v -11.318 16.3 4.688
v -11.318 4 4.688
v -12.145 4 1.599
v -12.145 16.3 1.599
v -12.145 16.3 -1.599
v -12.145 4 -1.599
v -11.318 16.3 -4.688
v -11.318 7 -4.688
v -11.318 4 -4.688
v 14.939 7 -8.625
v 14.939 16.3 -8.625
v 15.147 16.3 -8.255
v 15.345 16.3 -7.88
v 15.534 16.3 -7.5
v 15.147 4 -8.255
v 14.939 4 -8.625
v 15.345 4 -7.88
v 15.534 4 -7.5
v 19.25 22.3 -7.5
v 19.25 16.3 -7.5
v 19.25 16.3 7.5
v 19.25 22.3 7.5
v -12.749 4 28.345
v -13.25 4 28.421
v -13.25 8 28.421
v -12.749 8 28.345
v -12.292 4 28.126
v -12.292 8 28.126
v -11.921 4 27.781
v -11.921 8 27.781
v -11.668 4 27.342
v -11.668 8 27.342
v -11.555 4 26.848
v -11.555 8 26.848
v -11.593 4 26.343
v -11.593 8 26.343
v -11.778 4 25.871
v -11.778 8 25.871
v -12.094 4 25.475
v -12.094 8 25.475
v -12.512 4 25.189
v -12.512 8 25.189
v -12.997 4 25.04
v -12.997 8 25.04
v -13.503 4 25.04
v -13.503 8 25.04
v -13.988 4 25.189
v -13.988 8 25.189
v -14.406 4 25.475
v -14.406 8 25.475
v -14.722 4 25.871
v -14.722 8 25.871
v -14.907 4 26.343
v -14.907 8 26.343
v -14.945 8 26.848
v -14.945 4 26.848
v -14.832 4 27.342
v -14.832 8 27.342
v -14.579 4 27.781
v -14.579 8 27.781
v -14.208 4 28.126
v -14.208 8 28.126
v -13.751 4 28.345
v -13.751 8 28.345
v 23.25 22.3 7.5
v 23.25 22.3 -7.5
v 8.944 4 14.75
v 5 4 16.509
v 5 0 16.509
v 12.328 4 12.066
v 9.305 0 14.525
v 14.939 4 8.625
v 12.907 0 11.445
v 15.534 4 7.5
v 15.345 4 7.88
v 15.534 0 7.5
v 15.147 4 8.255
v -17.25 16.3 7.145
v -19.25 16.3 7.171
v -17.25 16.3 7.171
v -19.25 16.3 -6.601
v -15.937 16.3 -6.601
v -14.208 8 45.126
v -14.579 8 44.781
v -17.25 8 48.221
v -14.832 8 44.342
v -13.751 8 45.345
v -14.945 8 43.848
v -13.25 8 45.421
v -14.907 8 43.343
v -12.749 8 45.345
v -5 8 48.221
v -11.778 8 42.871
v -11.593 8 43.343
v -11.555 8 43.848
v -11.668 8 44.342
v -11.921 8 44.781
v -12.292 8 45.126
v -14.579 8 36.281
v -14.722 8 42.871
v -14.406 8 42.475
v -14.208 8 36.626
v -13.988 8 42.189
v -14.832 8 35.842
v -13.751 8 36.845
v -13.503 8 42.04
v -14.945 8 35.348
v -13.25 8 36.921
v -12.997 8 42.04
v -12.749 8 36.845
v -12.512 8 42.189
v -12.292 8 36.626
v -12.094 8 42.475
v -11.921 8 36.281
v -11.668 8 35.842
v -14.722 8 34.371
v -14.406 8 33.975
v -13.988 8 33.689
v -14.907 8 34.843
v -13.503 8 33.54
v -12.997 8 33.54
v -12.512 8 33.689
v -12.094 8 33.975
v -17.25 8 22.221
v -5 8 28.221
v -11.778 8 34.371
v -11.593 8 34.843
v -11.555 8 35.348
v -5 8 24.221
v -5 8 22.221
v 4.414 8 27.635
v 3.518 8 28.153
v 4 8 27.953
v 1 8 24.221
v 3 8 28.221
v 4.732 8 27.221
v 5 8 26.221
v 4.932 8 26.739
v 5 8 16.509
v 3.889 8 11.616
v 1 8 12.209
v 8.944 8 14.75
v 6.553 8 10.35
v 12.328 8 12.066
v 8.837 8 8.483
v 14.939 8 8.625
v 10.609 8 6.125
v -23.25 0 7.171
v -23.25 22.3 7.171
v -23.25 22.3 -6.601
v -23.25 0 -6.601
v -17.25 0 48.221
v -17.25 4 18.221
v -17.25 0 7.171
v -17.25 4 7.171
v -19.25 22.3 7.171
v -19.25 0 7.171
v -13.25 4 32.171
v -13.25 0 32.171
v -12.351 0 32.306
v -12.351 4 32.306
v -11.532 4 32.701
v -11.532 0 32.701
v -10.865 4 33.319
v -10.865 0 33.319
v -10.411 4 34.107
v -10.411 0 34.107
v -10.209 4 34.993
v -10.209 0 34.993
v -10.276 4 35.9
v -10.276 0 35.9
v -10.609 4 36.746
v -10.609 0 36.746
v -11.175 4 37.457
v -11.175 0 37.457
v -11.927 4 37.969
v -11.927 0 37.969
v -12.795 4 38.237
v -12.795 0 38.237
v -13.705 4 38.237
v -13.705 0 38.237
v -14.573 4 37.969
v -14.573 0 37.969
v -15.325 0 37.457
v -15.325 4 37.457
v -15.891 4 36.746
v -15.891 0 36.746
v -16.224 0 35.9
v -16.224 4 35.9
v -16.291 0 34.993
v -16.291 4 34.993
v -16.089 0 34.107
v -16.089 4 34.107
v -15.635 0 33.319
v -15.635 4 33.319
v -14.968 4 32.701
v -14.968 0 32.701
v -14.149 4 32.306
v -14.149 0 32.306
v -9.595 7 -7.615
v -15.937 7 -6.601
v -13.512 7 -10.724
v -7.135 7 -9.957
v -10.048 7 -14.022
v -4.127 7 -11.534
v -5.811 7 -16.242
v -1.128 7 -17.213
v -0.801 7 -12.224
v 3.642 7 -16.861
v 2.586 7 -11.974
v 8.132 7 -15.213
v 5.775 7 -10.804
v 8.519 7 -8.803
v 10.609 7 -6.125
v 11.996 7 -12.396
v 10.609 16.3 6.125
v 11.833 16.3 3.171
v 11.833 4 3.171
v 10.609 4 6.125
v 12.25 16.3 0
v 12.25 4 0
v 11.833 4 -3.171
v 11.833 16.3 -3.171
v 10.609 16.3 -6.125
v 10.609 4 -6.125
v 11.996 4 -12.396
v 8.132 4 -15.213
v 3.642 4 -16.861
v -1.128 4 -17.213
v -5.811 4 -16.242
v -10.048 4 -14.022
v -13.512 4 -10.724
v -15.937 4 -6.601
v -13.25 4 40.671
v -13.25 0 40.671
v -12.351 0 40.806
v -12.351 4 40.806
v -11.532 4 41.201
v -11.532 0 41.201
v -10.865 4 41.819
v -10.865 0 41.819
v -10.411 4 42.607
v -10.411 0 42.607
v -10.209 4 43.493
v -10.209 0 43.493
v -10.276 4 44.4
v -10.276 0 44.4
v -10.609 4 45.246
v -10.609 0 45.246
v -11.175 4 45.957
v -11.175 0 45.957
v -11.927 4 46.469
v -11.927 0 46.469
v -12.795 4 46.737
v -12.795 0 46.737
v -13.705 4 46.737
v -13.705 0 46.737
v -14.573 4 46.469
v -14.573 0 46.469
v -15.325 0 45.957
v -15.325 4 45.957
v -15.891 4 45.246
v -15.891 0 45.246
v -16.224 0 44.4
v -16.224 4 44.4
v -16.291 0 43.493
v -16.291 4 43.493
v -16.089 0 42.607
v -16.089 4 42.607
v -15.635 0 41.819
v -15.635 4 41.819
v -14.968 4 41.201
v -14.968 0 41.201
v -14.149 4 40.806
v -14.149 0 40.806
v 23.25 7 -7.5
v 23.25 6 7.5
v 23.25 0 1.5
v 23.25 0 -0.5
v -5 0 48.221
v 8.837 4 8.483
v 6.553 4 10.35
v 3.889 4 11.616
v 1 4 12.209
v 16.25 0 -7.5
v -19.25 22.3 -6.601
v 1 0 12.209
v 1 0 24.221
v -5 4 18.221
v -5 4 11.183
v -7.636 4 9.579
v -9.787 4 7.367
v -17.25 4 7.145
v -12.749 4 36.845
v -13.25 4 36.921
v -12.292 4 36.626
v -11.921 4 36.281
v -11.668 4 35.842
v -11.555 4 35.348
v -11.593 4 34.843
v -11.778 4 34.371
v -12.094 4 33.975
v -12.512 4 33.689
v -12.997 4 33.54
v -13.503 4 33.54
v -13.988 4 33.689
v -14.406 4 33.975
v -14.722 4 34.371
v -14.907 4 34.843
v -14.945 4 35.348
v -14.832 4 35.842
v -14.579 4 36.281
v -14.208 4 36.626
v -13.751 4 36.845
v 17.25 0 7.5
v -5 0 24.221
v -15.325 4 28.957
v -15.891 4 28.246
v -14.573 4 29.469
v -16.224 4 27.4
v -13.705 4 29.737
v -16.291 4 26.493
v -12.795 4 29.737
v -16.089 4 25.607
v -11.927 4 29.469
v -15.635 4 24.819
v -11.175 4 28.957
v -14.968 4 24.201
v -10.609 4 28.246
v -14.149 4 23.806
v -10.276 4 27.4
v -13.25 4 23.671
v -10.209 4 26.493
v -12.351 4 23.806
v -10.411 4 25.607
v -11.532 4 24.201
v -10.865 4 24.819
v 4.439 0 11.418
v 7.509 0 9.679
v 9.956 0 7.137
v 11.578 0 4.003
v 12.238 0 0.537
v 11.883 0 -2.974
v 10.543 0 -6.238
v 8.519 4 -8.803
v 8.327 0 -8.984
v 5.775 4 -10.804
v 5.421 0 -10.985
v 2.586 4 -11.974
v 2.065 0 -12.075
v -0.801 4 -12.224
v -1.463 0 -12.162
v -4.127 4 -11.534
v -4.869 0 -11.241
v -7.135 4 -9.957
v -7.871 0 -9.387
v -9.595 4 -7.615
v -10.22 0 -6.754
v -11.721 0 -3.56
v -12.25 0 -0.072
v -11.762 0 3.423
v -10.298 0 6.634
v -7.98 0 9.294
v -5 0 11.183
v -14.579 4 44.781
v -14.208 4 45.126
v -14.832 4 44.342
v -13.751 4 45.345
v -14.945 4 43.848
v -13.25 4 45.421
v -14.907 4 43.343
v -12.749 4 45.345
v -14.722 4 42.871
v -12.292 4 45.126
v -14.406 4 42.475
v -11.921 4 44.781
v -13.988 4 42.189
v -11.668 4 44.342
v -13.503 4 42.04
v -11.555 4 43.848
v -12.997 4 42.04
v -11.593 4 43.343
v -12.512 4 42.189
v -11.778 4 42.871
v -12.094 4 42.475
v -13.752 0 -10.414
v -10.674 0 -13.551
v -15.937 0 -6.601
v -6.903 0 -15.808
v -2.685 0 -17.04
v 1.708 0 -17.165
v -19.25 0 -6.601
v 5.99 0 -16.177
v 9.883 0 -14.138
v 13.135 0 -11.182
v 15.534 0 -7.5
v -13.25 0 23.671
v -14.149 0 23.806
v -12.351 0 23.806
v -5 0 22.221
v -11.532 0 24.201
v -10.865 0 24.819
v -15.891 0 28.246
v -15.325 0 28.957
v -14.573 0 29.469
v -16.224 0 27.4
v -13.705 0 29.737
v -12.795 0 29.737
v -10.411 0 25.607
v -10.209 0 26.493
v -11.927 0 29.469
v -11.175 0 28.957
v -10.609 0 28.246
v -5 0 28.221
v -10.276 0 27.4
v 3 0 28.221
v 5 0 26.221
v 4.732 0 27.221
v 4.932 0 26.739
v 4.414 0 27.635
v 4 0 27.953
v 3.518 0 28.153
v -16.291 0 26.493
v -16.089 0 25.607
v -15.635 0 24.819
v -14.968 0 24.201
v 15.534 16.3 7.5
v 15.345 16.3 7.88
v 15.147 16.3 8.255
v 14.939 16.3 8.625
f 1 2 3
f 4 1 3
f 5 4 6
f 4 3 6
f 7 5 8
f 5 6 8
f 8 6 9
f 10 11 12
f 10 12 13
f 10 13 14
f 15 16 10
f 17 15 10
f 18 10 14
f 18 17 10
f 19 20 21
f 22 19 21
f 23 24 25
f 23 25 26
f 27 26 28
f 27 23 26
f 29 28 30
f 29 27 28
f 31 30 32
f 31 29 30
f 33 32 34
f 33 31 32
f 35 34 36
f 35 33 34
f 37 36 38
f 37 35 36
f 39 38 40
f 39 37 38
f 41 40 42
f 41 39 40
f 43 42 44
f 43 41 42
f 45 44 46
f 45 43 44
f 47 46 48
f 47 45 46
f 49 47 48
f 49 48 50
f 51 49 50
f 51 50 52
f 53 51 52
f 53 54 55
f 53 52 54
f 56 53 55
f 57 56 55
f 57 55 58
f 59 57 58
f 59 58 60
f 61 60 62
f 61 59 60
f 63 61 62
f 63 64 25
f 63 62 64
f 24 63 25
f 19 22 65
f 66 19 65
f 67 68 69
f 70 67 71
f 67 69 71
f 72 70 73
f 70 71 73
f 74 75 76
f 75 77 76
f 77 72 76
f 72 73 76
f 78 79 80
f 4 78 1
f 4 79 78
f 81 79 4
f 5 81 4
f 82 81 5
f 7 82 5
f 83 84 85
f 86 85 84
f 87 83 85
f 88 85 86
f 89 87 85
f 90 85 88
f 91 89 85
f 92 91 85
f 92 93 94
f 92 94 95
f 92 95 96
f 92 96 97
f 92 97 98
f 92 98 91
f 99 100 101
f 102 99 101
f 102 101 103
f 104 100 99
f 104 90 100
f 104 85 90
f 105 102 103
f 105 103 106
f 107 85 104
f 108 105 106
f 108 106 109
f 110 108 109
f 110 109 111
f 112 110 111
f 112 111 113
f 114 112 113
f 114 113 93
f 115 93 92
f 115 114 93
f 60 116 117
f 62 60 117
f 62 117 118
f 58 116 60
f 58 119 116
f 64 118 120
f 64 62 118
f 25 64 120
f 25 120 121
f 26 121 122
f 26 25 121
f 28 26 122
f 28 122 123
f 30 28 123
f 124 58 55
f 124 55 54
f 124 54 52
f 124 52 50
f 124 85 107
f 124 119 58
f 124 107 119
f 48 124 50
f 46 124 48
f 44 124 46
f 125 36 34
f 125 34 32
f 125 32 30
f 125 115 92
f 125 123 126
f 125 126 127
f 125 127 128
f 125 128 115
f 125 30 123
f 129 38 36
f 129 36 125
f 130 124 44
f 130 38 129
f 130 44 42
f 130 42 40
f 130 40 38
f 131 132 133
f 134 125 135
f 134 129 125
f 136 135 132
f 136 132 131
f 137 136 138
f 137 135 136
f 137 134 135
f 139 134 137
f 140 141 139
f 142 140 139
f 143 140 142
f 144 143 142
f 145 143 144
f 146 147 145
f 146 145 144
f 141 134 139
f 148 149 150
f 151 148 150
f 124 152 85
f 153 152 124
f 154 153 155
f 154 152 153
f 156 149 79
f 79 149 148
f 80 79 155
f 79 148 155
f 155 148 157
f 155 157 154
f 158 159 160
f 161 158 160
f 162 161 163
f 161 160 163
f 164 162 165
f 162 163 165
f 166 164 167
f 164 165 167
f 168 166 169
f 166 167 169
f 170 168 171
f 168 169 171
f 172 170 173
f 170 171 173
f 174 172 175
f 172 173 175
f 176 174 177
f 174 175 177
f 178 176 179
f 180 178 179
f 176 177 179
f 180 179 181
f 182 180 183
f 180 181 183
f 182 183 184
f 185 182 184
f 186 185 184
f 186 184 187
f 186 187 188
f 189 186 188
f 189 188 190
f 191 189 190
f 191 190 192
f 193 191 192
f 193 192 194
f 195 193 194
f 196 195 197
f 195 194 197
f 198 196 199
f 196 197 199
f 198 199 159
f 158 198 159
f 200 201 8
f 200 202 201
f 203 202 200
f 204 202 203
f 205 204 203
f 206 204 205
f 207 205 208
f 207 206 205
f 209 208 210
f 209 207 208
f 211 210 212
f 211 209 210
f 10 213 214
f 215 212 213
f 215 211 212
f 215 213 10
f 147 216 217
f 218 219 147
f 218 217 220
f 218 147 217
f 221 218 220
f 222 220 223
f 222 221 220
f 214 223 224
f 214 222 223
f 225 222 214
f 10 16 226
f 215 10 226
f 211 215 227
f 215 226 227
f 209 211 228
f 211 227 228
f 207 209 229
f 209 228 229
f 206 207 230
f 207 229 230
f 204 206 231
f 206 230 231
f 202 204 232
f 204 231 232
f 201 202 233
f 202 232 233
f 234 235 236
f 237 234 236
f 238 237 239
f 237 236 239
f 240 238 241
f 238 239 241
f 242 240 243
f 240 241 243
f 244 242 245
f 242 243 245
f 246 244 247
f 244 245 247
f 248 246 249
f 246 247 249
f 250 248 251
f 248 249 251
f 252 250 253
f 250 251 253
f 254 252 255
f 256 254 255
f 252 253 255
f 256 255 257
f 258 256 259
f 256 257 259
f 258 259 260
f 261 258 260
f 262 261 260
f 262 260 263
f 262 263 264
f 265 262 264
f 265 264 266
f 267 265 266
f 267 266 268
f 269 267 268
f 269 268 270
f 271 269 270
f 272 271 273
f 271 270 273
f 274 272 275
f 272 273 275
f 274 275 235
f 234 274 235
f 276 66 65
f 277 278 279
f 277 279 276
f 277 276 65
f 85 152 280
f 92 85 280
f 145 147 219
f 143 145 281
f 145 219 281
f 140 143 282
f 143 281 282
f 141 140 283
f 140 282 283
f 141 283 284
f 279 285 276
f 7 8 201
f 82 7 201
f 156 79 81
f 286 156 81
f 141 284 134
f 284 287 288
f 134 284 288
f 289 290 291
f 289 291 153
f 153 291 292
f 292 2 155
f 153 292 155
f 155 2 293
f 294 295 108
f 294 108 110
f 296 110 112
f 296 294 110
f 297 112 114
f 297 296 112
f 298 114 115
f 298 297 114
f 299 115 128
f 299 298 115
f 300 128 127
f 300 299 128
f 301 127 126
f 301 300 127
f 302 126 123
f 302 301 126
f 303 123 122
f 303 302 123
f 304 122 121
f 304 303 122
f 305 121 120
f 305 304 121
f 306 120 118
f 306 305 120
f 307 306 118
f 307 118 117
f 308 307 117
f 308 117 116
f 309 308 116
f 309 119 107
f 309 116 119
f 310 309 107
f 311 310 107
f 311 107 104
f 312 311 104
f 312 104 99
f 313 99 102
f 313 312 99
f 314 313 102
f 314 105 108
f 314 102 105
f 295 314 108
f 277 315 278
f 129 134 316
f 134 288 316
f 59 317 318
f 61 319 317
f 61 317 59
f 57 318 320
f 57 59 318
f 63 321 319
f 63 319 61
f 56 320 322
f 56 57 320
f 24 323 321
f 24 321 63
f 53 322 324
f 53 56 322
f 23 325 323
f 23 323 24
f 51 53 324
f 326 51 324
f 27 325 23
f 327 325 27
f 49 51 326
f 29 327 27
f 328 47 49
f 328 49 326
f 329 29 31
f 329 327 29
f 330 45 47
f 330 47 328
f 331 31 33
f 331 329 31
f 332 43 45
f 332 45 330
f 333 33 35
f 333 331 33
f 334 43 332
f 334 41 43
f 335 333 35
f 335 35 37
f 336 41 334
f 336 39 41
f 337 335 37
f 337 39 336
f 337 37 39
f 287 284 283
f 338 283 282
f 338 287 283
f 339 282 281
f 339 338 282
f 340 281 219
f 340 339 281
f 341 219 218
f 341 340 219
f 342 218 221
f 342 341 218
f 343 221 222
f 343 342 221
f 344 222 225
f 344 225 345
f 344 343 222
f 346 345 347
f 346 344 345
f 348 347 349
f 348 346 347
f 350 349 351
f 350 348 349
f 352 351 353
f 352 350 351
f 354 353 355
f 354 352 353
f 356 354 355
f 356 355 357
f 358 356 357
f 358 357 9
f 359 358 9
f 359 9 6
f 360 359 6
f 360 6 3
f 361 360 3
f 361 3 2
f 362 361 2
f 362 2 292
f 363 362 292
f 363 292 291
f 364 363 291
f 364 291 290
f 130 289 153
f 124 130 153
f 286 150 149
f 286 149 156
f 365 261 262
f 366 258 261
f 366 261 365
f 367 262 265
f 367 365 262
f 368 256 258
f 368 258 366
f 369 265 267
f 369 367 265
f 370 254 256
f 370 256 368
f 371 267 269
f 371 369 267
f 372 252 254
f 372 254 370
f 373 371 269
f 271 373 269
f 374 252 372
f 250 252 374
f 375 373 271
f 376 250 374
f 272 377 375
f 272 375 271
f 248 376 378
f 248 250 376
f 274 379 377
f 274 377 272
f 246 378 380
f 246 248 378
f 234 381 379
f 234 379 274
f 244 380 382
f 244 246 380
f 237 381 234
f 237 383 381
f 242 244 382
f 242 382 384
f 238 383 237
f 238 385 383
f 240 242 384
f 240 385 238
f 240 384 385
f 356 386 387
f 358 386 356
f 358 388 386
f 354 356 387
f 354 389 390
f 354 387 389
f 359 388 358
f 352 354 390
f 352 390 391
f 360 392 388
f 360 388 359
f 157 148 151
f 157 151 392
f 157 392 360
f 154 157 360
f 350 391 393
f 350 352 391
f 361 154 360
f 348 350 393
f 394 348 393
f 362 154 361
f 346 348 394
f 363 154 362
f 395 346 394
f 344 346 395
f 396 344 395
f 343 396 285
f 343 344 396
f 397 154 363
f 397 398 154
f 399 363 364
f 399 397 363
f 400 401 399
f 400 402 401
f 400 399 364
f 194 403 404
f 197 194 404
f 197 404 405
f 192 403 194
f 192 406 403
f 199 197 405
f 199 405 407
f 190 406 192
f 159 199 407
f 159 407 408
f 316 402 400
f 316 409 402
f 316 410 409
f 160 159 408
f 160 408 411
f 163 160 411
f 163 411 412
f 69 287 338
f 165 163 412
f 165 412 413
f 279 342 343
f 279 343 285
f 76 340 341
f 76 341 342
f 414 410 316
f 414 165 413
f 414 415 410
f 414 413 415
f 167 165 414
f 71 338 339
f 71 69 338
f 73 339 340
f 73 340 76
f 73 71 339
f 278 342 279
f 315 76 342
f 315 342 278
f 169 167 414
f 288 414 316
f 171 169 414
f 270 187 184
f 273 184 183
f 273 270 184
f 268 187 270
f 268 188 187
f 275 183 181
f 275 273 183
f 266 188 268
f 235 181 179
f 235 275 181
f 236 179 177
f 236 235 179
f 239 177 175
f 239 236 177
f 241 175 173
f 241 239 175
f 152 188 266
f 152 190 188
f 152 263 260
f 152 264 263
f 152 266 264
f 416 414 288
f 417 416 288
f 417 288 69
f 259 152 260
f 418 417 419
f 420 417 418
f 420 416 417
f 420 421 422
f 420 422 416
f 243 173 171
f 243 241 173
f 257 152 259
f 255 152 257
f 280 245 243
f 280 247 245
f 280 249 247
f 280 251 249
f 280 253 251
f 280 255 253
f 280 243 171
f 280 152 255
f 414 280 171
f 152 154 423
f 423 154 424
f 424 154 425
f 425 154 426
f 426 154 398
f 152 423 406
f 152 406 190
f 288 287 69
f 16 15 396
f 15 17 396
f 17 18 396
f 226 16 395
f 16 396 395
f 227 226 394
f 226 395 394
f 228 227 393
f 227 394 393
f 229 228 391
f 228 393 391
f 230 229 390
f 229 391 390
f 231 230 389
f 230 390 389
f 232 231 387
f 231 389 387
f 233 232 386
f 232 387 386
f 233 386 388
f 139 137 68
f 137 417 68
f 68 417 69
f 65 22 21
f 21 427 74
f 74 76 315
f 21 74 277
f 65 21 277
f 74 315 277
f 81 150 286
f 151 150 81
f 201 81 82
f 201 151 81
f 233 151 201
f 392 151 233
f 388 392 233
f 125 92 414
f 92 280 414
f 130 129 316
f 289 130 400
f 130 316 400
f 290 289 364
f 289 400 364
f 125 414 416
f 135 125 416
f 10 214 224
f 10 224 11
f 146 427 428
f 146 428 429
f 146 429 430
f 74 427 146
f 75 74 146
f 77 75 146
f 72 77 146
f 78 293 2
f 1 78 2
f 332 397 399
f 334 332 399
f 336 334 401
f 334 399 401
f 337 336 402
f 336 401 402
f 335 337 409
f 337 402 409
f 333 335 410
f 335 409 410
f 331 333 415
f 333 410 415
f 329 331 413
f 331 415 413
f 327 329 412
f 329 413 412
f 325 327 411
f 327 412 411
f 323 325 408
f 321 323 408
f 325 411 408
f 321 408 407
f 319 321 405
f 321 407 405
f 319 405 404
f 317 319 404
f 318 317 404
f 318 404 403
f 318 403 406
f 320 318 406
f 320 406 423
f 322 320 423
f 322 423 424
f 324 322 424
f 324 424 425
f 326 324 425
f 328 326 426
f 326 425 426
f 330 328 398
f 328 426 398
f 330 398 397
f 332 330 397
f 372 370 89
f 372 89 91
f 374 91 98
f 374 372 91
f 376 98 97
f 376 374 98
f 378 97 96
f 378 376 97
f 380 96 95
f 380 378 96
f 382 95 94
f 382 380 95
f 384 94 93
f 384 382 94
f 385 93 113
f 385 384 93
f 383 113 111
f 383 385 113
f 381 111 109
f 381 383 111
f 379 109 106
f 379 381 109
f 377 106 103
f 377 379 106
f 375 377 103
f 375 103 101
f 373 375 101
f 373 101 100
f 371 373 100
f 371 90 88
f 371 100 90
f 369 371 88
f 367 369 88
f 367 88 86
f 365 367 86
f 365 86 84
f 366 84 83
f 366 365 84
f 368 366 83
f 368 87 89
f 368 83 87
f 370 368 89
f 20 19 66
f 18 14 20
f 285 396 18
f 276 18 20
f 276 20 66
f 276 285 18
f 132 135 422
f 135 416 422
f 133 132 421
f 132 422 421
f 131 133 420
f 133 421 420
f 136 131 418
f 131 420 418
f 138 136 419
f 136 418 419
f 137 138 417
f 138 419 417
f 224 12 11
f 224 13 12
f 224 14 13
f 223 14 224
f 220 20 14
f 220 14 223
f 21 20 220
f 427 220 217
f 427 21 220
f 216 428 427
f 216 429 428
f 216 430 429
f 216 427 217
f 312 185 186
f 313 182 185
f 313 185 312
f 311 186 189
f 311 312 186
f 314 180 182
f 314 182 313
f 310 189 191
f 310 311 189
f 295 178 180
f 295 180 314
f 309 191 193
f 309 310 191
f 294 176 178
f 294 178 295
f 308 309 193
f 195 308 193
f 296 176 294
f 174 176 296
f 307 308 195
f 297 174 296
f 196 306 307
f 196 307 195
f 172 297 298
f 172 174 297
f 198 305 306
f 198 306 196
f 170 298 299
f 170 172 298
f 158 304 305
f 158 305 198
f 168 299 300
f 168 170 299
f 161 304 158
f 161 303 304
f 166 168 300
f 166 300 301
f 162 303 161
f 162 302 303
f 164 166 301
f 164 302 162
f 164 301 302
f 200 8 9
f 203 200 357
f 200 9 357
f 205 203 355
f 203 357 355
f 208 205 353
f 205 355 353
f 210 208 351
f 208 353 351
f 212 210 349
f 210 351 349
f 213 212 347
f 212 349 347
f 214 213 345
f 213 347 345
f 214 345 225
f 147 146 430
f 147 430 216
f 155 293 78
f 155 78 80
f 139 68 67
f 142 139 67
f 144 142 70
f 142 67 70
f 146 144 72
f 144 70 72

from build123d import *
from build123d.topology import SkipClean

# Parameters (mm, degrees)
SKETCH1_R                = 17.25
SKETCH1_R_2              = 12.25
BOSS_EXTRUDE1_DEPTH      = 4
SKETCH2_W                = 6
SKETCH2_H                = 6.066865377
CUT_EXTRUDE1_DEPTH       = 25.720942539
BOSS_EXTRUDE2_START      = -4
BOSS_EXTRUDE2_DEPTH      = 4
BOSS_EXTRUDE3_DEPTH      = 12.3
BOSS_EXTRUDE4_DEPTH      = 4
BOSS_EXTRUDE4_DEPTH_BACK = 4
SKETCH5_W                = 12.25
SKETCH5_H                = 26
CUT_EXTRUDE2_DEPTH       = 53.669881205
CUT_EXTRUDE2_DEPTH_BACK  = 53.669881205
SKETCH6_R                = 1.7
SKETCH7_R                = 3.05
CUT_EXTRUDE6_DEPTH       = 4
CHAMFER1_SIZE            = 4
BOSS_EXTRUDE5_REACH      = 55.745
BOSS_EXTRUDE6_DEPTH      = 6
BOSS_EXTRUDE6_DEPTH_BACK = 16.3
SKETCH9_W                = 4
SKETCH9_H                = 13.772279307
BOSS_EXTRUDE7_DEPTH      = 4
BOSS_EXTRUDE8_DEPTH      = 16.3
SKETCH12_W               = 4
SKETCH12_H               = 15
BOSS_EXTRUDE9_DEPTH      = 22.3
CHAMFER2_START           = 13.712068893
CHAMFER2_OUTLINE_W       = 11
CHAMFER2_OUTLINE_H       = 13
CHAMFER2_DEPTH           = 5.287931107
CHAMFER3_START           = 14.289419162
CHAMFER3_OUTLINE_W       = 10
CHAMFER3_OUTLINE_H       = 11
CHAMFER3_DEPTH           = 10.664231106
BOSS_EXTRUDE10_DEPTH     = 3
BOSS_EXTRUDE11_DEPTH     = 4


with BuildPart() as part:
    # Sketch1 → Boss-Extrude1 (new body)
    with BuildSketch(Plane(origin=(0, 0, 0), x_dir=(1, 0, 0), z_dir=(0, 1, 0))):
        with Locations(Location((0, 0, 0), (0, 0, 270))):
            Circle(SKETCH1_R)
        with Locations(Location((0, 0, 0), (0, 0, 270))):
            Circle(SKETCH1_R_2, mode=Mode.SUBTRACT)
    extrude(amount=BOSS_EXTRUDE1_DEPTH)

    # Sketch2 → Cut-Extrude1 (cut, through all)
    with BuildSketch(Plane(origin=(0, 4, 0), x_dir=(1, 0, 0), z_dir=(0, 1, 0))):
        with Locations((-2, -14.216567312)):
            Rectangle(SKETCH2_W, SKETCH2_H)
    extrude(amount=-CUT_EXTRUDE1_DEPTH, mode=Mode.SUBTRACT)

    # Sketch3 → Boss-Extrude2 (add)
    with BuildSketch(Plane(origin=(0, 4, 0), x_dir=(1, 0, 0), z_dir=(0, 1, 0)).offset(BOSS_EXTRUDE2_START)):
        with BuildLine():
            Line((-5, -16.509466981), (-5, -22.220990099))
            Line((-5, -22.220990099), (-17.25, -22.220990099))
            Line((-17.25, -22.220990099), (-17.25, 0))
            ThreePointArc((-17.25, 0), (-13.853023136, -10.278922609), (-5, -16.509466981))
        make_face()
    extrude(amount=BOSS_EXTRUDE2_DEPTH)

    # Sketch4 → Boss-Extrude3 (add)
    with SkipClean():  # the faces are left unmerged after this step: merging them gives an invalid solid
        with BuildSketch(Plane(origin=(0, 4, 0), x_dir=(1, 0, 0), z_dir=(0, 1, 0))):
            with BuildLine():
                Line((-17.25, 0), (-17.25, -7.145183951))
                Line((-17.25, -7.145183951), (-11.317524273, -4.687872046))
                ThreePointArc((-11.317524273, -4.687872046), (-12.25, 0), (-11.317524273, 4.687872046))
                Line((-11.317524273, 4.687872046), (-15.936921936, 6.601289208))
                ThreePointArc((-15.936921936, 6.601289208), (-16.918546087, 3.365308055), (-17.25, 0))
            make_face()
            with BuildLine():
                Line((10.608811196, 6.125), (14.938938215, 8.625))
                ThreePointArc((14.938938215, 8.625), (17.25, 0), (14.938938215, -8.625))
                Line((14.938938215, -8.625), (10.608811196, -6.125))
                ThreePointArc((10.608811196, -6.125), (12.25, 0), (10.608811196, 6.125))
            make_face()
        extrude(amount=BOSS_EXTRUDE3_DEPTH)

    # Sketch5 → Boss-Extrude4 (add, two sides: drawn at the far end of the back side and taken through both)
    with SkipClean():  # the faces are left unmerged after this step: merging them gives an invalid solid
        with BuildSketch(Plane(origin=(0, 4, 0), x_dir=(1, 0, 0), z_dir=(0, 1, 0)).offset(-BOSS_EXTRUDE4_DEPTH_BACK)):
            with Locations((-11.125, -35.220990099)):
                Rectangle(SKETCH5_W, SKETCH5_H)
        extrude(amount=BOSS_EXTRUDE4_DEPTH + BOSS_EXTRUDE4_DEPTH_BACK)

    # Sketch6 → Cut-Extrude2 (cut, two sides: drawn at the far end of the back side and taken through both)
    with SkipClean():  # the faces are left unmerged after this step: merging them gives an invalid solid
        with BuildSketch(Plane(origin=(0, 4, 0), x_dir=(1, 0, 0), z_dir=(0, 1, 0)).offset(-CUT_EXTRUDE2_DEPTH_BACK)):
            with Locations(Location((-13.25, -43.720990099, 0), (0, 0, 270))):
                Circle(SKETCH6_R)
            with Locations(Location((-13.25, -35.220990099, 0), (0, 0, 270))):
                Circle(SKETCH6_R)
            with Locations(Location((-13.25, -26.720990099, 0), (0, 0, 270))):
                Circle(SKETCH6_R)
        extrude(amount=CUT_EXTRUDE2_DEPTH + CUT_EXTRUDE2_DEPTH_BACK, mode=Mode.SUBTRACT)

    # Sketch7 → Cut-Extrude6 (cut)
    with SkipClean():  # the faces are left unmerged after this step: merging them gives an invalid solid
        with BuildSketch(Plane.XZ):
            with Locations(Location((-13.25, 43.720990099, 0), (0, 0, 270))):
                Circle(SKETCH7_R)
            with Locations(Location((-13.25, 35.220990099, 0), (0, 0, 270))):
                Circle(SKETCH7_R)
            with Locations(Location((-13.25, 26.720990099, 0), (0, 0, 270))):
                Circle(SKETCH7_R)
        extrude(amount=-CUT_EXTRUDE6_DEPTH, mode=Mode.SUBTRACT)

    # Chamfer1
    chamfer1_edges = [part.edges().sort_by_distance(p)[0] for p in [
        (-11.125, 4, 22.220990099),
    ]]
    chamfer(chamfer1_edges, length=CHAMFER1_SIZE - 0.0001)  # a hair under: the kernel refuses the full size

    # Boss-Extrude5: up to this face of the body (flat: up to its plane)
    boss_extrude5_end = Plane(part.part.faces().sort_by_distance((-14.634101331, 16.3, 0.270569761))[0])
    # Sketch8 → Boss-Extrude5 (add, up to the picked face)
    with BuildSketch(Plane.XZ, mode=Mode.PRIVATE) as boss_extrude5_sk1:
        with BuildLine():
            Line((-17.25, 0), (-17.25, 7.170990099))
            Line((-17.25, 7.170990099), (-19.25, 7.170990099))
            Line((-19.25, 7.170990099), (-19.25, -6.601289208))
            Line((-19.25, -6.601289208), (-15.936921936, -6.601289208))
            ThreePointArc((-15.936921936, -6.601289208), (-16.918546087, -3.365308055), (-17.25, 0))
        make_face()
    boss_extrude5_tool1 = split(extrude(boss_extrude5_sk1.sketch, amount=-BOSS_EXTRUDE5_REACH, mode=Mode.PRIVATE), bisect_by=boss_extrude5_end, keep=Keep.BOTH, mode=Mode.PRIVATE)
    add(boss_extrude5_tool1.solids().sort_by(Axis((-18.119805, 0, -0.206337), (0, 1, 0)))[0])

    # Sketch9 → Boss-Extrude6 (add, two sides: drawn at the far end of the back side and taken through both)
    with BuildSketch(Plane(origin=(0, 16.3, 0), x_dir=(1, 0, 0), z_dir=(0, 1, 0)).offset(-BOSS_EXTRUDE6_DEPTH_BACK)):
        with Locations((-21.25, -0.284850446)):
            Rectangle(SKETCH9_W, SKETCH9_H)
    extrude(amount=BOSS_EXTRUDE6_DEPTH + BOSS_EXTRUDE6_DEPTH_BACK)

    # Sketch10 → Boss-Extrude7 (add)
    with BuildSketch(Plane.XZ):
        with BuildLine():
            Line((-5, 24.220990099), (1, 24.220990099))
            Line((1, 24.220990099), (1, 17.220990099))
            ThreePointArc((1, 17.220990099), (3.021020736, 16.983401712), (5, 16.509466981))
            Line((5, 16.509466981), (5, 26.220990099))
            ThreePointArc((5, 26.220990099), (4.414213562, 27.635203662), (3, 28.220990099))
            Line((3, 28.220990099), (-5, 28.220990099))
            Line((-5, 28.220990099), (-5, 24.220990099))
        make_face()
    extrude(amount=-BOSS_EXTRUDE7_DEPTH)

    # Sketch11 → Boss-Extrude8 (add)
    with BuildSketch(Plane.XZ):
        with BuildLine():
            Line((15.534236383, 7.5), (19.25, 7.5))
            Line((19.25, 7.5), (19.25, -7.5))
            Line((19.25, -7.5), (15.534236383, -7.5))
            ThreePointArc((15.534236383, -7.5), (17.25, 0), (15.534236383, 7.5))
        make_face()
    extrude(amount=-BOSS_EXTRUDE8_DEPTH)

    # Sketch12 → Boss-Extrude9 (add)
    with BuildSketch(Plane.XZ):
        with Locations((21.25, 0)):
            Rectangle(SKETCH12_W, SKETCH12_H)
    extrude(amount=-BOSS_EXTRUDE9_DEPTH)

    # Chamfer2: read off the stored shape, not the designer's step
    # Chamfer2 outline → Chamfer2 (cut)
    with BuildSketch(Plane(origin=(0, 0, 0), x_dir=(0.8164965809277258, 0.40824829046386313, 0.40824829046386313), z_dir=(0.5773502691896258, -0.5773502691896258, -0.5773502691896258)).offset(CHAMFER2_START)):
        with Locations((14.5, -5.5)):
            Rectangle(CHAMFER2_OUTLINE_W, CHAMFER2_OUTLINE_H)
    extrude(amount=CHAMFER2_DEPTH, mode=Mode.SUBTRACT)

    # Chamfer3: read off the stored shape, not the designer's step
    # Chamfer3 outline → Chamfer3 (cut)
    with BuildSketch(Plane(origin=(0, 0, 0), x_dir=(0.8164965809277258, 0.40824829046386313, -0.40824829046386313), z_dir=(0.5773502691896258, -0.5773502691896258, 0.5773502691896258)).offset(CHAMFER3_START)):
        with Locations((15, 5.5)):
            Rectangle(CHAMFER3_OUTLINE_W, CHAMFER3_OUTLINE_H)
    extrude(amount=CHAMFER3_DEPTH, mode=Mode.SUBTRACT)

    # Sketch13 → Boss-Extrude10 (add)
    with BuildSketch(Plane(origin=(0, 4, 0), x_dir=(1, 0, 0), z_dir=(0, 1, 0))):
        with BuildLine():
            Line((-15.936921936, 6.601289208), (-11.317524273, 4.687872046))
            ThreePointArc((-11.317524273, 4.687872046), (-0.801188333, 12.22377181), (10.608811196, 6.125))
            Line((10.608811196, 6.125), (14.938938215, 8.625))
            ThreePointArc((14.938938215, 8.625), (-1.128203979, 17.213066426), (-15.936921936, 6.601289208))
        make_face()
    extrude(amount=BOSS_EXTRUDE10_DEPTH)

    # Sketch14 → Boss-Extrude11 (add)
    with BuildSketch(Plane(origin=(0, 4, 0), x_dir=(1, 0, 0), z_dir=(0, 1, 0))):
        with BuildLine():
            Line((14.938938215, -8.625), (10.608811196, -6.125))
            ThreePointArc((10.608811196, -6.125), (6.553261748, -10.349746879), (1, -12.209115447))
            Line((1, -12.209115447), (1, -24.220990099))
            Line((1, -24.220990099), (-5, -24.220990099))
            Line((-5, -24.220990099), (-5, -28.220990099))
            Line((-5, -28.220990099), (3, -28.220990099))
            ThreePointArc((3, -28.220990099), (4.414213562, -27.635203662), (5, -26.220990099))
            Line((5, -26.220990099), (5, -16.509466981))
            ThreePointArc((5, -16.509466981), (10.720611885, -13.514103034), (14.938938215, -8.625))
        make_face()
    extrude(amount=BOSS_EXTRUDE11_DEPTH)


solid = part.part
